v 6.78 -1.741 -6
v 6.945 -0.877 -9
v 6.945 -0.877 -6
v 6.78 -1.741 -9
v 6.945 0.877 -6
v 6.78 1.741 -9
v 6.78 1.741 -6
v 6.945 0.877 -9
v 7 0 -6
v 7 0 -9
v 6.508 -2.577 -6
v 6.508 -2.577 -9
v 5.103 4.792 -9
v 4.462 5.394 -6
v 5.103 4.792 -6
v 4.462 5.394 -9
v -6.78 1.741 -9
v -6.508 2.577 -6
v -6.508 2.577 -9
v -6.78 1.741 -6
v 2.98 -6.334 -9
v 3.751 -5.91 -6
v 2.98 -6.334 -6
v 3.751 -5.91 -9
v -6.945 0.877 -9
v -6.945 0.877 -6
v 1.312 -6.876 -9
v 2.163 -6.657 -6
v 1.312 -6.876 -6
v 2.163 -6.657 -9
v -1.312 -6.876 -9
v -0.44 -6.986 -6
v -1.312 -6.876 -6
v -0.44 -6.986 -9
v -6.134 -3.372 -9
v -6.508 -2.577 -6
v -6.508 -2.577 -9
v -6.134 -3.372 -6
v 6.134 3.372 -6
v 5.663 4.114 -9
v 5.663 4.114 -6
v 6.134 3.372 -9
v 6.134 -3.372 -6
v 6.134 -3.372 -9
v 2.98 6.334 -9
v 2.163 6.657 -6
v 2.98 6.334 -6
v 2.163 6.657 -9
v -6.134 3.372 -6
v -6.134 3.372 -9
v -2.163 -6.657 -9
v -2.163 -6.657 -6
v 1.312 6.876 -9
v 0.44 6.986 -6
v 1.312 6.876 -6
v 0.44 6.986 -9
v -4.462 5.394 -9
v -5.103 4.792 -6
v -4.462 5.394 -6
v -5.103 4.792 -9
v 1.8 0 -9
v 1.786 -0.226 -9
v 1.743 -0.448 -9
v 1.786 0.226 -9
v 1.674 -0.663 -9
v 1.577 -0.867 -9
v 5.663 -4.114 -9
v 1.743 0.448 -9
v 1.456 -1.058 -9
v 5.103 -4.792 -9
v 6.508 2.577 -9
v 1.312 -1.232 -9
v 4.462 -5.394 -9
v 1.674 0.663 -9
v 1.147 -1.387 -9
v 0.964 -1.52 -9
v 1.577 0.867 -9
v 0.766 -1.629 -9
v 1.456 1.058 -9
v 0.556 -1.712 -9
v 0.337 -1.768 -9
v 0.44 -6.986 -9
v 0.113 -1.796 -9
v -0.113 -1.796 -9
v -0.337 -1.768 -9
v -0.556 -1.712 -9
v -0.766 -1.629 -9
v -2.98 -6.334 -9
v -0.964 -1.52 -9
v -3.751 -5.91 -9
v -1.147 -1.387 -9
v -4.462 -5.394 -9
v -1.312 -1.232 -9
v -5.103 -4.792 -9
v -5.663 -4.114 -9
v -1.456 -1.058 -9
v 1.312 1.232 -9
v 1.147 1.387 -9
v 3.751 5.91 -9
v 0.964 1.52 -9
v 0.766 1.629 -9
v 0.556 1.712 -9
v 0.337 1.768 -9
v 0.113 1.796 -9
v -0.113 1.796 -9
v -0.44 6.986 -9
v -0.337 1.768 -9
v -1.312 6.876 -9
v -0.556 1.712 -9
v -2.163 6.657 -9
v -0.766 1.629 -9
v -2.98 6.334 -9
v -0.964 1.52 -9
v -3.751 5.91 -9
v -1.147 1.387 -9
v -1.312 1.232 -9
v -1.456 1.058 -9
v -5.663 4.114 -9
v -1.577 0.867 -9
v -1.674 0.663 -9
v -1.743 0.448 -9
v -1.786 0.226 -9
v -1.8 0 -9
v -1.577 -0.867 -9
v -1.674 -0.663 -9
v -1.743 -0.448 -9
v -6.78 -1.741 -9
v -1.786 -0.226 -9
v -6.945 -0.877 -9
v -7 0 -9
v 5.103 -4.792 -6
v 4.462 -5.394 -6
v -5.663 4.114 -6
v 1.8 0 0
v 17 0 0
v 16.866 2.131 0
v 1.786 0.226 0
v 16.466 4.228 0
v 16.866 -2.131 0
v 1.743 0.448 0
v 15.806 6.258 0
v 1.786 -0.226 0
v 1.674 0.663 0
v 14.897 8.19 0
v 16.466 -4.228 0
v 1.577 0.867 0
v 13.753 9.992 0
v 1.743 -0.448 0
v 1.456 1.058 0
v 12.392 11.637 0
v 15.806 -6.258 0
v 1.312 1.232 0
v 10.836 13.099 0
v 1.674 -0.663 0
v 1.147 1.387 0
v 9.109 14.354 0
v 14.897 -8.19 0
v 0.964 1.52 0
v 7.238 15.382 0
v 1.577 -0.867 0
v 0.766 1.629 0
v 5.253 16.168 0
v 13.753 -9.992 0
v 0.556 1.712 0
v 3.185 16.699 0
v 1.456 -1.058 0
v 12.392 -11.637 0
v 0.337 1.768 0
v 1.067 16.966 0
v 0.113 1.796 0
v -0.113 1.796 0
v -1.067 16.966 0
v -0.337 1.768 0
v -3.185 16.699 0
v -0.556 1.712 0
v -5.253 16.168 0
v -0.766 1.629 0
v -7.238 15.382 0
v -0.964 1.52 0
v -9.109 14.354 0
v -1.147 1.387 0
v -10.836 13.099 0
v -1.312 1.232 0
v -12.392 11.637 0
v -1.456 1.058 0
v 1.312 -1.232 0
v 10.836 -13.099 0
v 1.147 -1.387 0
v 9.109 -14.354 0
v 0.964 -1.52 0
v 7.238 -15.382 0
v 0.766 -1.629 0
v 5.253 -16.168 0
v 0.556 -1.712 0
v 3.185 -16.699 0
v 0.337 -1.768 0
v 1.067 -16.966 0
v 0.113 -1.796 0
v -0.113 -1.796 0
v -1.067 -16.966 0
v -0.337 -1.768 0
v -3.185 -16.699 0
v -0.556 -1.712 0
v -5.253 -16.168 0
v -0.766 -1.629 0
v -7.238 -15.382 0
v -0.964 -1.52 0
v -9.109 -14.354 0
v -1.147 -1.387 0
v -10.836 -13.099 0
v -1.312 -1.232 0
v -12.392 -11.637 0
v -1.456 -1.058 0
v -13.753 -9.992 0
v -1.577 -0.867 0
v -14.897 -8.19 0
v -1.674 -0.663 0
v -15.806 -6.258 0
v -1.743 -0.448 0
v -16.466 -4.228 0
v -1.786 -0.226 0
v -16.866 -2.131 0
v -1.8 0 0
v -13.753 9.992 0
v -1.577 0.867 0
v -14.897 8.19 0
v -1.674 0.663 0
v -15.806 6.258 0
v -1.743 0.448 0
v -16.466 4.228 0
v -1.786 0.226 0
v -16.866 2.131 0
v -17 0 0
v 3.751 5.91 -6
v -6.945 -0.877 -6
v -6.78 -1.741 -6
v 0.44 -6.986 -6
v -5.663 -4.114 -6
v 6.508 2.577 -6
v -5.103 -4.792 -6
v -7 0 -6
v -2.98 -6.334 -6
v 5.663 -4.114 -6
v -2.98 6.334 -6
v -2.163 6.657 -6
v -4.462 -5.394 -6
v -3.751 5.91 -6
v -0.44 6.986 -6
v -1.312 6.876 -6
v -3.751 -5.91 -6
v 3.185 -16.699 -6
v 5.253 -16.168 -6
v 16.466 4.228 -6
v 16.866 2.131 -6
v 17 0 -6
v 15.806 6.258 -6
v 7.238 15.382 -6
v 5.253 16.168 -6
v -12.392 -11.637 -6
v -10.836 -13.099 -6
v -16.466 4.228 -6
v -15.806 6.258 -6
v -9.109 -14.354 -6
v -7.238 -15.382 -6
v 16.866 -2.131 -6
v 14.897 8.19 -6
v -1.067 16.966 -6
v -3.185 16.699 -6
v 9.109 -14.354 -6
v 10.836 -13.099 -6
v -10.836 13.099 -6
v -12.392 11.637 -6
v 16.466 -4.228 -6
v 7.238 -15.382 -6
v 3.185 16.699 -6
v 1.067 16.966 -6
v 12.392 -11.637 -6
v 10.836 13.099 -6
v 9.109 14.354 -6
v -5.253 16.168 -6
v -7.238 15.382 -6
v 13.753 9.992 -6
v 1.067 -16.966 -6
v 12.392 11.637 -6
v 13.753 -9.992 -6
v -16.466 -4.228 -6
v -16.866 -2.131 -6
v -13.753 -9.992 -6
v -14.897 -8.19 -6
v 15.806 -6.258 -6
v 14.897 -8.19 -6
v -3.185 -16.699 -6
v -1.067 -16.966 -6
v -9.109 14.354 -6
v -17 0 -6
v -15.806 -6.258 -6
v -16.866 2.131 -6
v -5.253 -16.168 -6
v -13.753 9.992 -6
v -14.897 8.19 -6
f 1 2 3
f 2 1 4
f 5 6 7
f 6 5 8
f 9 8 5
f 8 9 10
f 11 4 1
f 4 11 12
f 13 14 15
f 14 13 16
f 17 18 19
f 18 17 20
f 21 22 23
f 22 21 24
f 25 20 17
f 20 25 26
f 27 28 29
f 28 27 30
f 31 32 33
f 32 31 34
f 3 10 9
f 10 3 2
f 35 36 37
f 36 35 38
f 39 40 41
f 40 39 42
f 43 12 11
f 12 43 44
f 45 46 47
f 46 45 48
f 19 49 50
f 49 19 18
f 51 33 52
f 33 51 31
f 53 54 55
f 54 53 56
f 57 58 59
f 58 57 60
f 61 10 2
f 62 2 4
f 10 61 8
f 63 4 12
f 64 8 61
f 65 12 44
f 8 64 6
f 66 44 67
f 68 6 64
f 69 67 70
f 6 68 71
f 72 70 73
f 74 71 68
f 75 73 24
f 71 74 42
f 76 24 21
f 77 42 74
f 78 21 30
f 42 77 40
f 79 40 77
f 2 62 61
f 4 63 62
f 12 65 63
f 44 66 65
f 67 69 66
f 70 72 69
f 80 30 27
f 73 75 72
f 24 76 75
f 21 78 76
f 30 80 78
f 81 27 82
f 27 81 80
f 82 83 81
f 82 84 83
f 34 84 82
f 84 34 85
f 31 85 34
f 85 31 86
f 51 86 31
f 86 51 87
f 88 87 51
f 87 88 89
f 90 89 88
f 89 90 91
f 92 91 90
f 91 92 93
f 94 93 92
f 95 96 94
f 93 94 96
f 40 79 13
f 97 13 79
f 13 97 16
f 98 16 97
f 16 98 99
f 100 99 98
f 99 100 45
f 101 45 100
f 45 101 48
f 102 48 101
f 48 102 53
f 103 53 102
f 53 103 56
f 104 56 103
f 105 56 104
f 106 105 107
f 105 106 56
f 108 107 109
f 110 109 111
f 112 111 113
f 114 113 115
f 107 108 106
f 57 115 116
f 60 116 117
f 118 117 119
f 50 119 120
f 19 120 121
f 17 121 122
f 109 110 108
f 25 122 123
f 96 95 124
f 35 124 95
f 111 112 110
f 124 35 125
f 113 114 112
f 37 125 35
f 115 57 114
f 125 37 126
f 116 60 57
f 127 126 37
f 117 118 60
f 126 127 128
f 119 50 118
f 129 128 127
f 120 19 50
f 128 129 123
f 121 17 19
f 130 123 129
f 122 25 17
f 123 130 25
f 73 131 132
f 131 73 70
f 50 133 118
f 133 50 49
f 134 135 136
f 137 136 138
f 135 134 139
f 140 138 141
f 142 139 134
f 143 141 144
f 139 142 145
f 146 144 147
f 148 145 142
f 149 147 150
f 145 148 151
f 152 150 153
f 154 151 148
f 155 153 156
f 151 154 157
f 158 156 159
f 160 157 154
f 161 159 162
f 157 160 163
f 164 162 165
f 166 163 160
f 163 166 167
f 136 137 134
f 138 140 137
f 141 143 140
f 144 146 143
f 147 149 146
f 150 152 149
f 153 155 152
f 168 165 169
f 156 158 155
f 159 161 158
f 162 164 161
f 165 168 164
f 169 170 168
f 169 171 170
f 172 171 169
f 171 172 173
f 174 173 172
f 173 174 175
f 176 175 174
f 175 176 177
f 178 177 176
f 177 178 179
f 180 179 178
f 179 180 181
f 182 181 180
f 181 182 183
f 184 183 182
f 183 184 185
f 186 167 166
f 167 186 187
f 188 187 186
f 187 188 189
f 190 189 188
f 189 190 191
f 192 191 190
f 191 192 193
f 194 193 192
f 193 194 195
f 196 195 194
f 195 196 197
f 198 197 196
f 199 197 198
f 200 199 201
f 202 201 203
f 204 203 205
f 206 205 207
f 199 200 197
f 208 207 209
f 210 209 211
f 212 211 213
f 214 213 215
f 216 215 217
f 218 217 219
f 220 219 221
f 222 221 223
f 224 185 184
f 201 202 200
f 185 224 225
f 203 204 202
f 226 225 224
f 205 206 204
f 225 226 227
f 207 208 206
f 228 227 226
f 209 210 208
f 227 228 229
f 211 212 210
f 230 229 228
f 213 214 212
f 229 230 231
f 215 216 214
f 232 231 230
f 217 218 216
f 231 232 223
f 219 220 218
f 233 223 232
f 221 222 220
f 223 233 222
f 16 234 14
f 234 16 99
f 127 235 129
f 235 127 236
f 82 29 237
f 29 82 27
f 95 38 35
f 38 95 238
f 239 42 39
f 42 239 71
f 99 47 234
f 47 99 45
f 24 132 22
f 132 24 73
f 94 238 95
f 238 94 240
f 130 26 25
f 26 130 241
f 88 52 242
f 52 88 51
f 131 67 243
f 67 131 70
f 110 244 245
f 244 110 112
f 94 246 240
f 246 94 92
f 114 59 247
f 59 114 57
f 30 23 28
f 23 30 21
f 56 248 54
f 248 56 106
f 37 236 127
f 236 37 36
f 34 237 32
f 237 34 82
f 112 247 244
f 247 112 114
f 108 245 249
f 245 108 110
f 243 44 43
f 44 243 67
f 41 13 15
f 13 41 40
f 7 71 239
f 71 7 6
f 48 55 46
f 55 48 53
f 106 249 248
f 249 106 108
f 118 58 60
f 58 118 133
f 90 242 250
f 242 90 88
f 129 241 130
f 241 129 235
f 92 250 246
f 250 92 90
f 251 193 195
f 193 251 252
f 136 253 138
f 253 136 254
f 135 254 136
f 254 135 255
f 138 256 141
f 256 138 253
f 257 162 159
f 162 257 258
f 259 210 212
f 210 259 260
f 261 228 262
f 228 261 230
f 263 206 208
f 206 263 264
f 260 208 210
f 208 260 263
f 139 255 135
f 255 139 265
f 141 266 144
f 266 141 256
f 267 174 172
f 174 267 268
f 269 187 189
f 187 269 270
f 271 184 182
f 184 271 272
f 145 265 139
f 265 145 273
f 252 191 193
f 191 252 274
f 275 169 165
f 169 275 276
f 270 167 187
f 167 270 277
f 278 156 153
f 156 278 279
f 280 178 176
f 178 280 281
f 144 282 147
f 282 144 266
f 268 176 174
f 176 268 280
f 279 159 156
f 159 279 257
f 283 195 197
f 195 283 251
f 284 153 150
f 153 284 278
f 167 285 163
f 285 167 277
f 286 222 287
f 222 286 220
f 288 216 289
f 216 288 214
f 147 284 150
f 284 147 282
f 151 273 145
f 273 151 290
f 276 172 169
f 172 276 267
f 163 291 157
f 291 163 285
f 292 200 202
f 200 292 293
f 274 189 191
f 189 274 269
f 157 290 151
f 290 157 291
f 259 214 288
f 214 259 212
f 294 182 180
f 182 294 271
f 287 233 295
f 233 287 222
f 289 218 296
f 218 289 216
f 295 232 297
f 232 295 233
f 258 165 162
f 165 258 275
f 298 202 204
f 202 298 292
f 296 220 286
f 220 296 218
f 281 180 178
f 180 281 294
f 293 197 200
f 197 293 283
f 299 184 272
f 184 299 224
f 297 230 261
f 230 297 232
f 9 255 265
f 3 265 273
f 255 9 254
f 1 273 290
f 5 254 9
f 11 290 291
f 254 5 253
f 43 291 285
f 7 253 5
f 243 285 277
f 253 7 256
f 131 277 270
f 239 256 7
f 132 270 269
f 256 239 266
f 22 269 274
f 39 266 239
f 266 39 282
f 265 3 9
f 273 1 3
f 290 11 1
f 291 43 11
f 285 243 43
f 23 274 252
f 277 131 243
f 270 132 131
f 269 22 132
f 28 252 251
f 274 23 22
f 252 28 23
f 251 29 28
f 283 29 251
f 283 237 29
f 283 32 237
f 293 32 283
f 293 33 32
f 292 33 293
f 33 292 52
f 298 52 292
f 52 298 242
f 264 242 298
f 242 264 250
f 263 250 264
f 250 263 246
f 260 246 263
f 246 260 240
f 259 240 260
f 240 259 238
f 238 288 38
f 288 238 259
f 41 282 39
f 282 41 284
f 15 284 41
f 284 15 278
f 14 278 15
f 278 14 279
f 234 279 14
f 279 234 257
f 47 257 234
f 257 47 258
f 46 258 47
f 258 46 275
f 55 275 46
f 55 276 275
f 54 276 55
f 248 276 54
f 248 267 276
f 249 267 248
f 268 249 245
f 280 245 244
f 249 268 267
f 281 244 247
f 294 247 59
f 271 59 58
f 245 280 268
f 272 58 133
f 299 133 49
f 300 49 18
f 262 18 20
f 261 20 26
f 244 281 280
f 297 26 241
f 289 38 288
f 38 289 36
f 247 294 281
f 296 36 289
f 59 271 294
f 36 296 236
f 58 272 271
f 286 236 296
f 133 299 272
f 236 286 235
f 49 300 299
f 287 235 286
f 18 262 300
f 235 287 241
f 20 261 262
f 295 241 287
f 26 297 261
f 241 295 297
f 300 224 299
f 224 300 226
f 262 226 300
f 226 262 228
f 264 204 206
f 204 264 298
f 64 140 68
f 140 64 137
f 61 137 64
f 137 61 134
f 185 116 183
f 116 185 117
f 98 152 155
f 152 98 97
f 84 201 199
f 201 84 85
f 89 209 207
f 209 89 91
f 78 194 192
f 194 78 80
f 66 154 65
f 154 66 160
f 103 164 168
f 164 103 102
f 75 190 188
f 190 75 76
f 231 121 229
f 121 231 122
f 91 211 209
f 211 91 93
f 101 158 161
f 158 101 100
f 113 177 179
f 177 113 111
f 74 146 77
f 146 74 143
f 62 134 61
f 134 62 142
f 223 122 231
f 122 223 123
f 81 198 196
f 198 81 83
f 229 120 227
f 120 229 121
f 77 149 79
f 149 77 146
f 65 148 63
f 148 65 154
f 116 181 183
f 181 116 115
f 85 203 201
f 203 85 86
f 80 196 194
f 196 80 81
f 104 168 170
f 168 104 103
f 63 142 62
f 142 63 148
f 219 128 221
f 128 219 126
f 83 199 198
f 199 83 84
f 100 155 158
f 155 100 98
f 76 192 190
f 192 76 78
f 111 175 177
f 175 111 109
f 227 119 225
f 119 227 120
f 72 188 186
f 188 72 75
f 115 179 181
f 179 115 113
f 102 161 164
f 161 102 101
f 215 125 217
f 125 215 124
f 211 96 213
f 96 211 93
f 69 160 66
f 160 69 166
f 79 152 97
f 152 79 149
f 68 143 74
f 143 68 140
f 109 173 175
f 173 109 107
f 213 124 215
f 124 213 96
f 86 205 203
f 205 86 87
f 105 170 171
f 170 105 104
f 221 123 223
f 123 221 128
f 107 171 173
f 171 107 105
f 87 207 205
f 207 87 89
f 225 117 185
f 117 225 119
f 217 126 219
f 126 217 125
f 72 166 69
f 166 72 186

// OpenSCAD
$fn = 50;


difference() {
	union() {
		translate(v = [0, 0, -9.0000000000]) {
			cylinder(h = 9, r = 7.0000000000);
		}
		translate(v = [0, 0, -6.0000000000]) {
			cylinder(h = 6, r = 17.0000000000);
		}
	}
	union() {
		#translate(v = [0, 0, -9]) {
			cylinder(h = 9, r = 1.8000000000);
		}
	}
}
